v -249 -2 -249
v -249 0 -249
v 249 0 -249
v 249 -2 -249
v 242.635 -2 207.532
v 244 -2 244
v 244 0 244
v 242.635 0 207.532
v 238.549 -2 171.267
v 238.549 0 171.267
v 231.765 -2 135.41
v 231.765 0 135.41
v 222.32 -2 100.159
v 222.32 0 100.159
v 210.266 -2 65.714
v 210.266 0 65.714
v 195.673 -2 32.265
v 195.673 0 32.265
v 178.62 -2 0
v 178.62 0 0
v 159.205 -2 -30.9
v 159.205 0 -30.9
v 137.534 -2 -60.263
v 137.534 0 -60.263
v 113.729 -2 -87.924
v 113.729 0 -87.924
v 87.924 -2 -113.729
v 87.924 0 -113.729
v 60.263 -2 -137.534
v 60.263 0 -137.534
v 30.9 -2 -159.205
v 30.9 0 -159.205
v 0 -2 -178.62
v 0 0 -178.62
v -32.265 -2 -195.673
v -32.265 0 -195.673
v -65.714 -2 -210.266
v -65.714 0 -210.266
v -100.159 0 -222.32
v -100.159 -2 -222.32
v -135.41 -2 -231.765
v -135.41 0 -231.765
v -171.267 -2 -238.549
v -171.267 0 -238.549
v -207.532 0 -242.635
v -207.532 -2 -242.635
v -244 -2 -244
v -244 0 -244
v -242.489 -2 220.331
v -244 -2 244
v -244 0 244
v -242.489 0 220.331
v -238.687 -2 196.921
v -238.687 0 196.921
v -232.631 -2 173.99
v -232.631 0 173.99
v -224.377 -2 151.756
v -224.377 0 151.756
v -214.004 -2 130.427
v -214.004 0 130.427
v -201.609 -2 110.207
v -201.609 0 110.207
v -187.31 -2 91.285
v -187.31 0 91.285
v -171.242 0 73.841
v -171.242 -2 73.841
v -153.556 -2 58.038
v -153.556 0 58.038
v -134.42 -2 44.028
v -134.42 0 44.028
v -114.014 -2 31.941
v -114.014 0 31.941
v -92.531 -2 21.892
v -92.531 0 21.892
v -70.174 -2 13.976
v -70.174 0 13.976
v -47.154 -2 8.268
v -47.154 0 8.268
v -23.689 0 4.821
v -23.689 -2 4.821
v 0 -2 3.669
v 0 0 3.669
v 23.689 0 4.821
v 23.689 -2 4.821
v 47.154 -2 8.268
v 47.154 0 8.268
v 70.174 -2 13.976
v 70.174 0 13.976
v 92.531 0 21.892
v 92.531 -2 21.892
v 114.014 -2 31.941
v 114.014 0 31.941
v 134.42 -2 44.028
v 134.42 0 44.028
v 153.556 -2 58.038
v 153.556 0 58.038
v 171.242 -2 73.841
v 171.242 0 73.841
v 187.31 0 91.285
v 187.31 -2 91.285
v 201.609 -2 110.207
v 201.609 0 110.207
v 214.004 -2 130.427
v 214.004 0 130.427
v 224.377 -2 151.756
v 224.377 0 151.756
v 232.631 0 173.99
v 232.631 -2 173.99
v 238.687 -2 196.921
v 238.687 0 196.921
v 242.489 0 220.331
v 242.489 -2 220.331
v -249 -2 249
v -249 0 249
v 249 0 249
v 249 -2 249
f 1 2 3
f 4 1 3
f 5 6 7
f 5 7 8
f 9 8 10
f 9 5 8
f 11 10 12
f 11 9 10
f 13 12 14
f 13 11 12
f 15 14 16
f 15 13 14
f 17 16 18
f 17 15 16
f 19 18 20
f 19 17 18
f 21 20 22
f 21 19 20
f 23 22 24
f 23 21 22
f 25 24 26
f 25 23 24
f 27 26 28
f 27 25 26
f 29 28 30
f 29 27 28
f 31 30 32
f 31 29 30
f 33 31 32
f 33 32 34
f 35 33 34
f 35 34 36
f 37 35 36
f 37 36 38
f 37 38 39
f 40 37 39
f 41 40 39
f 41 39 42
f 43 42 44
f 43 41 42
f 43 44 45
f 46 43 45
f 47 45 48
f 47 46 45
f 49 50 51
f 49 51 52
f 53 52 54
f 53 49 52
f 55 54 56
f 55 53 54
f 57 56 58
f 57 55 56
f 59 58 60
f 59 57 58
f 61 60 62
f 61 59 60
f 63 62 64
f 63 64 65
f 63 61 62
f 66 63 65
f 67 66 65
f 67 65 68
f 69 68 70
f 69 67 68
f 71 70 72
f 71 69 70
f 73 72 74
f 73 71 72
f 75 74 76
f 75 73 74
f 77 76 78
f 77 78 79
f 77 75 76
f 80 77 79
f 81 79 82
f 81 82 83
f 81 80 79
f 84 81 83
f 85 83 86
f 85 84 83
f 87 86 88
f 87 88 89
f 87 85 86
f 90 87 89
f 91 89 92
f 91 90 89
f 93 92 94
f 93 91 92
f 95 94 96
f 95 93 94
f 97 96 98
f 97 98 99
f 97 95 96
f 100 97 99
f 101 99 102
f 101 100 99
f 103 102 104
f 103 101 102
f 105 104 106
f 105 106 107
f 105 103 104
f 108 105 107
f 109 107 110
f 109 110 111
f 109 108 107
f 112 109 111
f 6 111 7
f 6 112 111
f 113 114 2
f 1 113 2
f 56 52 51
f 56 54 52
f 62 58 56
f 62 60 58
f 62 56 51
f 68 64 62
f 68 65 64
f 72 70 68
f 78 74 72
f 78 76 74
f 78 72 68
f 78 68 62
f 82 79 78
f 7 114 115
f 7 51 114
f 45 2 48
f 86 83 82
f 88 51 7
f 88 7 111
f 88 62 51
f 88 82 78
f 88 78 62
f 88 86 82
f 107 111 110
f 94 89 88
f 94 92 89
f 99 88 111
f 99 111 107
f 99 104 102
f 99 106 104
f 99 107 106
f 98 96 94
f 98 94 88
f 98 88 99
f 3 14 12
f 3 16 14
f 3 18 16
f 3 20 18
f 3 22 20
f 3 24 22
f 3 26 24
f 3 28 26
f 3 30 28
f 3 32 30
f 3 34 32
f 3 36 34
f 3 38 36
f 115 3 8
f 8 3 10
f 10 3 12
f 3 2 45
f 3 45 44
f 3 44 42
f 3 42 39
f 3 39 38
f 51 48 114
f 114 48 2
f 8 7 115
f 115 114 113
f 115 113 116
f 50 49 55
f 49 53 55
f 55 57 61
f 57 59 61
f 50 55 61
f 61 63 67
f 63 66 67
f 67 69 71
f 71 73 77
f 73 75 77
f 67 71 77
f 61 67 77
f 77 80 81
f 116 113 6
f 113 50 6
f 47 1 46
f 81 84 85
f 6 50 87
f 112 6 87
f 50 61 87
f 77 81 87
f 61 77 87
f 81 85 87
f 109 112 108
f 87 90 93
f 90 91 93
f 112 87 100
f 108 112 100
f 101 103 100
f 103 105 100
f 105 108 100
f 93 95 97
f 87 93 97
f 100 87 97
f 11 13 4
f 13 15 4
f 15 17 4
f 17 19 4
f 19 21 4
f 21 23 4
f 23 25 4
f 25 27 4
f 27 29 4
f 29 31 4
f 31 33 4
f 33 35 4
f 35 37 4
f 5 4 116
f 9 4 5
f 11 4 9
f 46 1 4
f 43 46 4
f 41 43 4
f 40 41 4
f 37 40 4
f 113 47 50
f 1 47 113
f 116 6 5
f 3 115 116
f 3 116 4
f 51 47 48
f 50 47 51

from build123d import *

# Parameters (mm, degrees)
SKIZZE1_W                       = 498
SKIZZE1_H                       = 498
AUFSATZ_LINEAR_AUSTRAGEN1_DEPTH = 2
SCHNITT_LINEAR_AUSTRAGEN2_DEPTH = 2


with BuildPart() as part:
    # Skizze1 → Aufsatz-Linear austragen1 (new body)
    with BuildSketch(Plane(origin=(0, 0, 0), x_dir=(1, 0, 0), z_dir=(0, 1, 0))):
        Rectangle(SKIZZE1_W, SKIZZE1_H)
    extrude(amount=-AUFSATZ_LINEAR_AUSTRAGEN1_DEPTH)

    # Skizze3 → Schnitt-Linear austragen2 (cut)
    with BuildSketch(Plane.XZ.offset(2)):
        with BuildLine():
            ThreePointArc((-244, 244), (0, 3.66854455), (244, 244))
            ThreePointArc((244, 244), (101.068109219, -101.068109219), (-244, -244))
            Line((-244, -244), (-244, 244))
        make_face()
    extrude(amount=-SCHNITT_LINEAR_AUSTRAGEN2_DEPTH, mode=Mode.SUBTRACT)


solid = part.part
